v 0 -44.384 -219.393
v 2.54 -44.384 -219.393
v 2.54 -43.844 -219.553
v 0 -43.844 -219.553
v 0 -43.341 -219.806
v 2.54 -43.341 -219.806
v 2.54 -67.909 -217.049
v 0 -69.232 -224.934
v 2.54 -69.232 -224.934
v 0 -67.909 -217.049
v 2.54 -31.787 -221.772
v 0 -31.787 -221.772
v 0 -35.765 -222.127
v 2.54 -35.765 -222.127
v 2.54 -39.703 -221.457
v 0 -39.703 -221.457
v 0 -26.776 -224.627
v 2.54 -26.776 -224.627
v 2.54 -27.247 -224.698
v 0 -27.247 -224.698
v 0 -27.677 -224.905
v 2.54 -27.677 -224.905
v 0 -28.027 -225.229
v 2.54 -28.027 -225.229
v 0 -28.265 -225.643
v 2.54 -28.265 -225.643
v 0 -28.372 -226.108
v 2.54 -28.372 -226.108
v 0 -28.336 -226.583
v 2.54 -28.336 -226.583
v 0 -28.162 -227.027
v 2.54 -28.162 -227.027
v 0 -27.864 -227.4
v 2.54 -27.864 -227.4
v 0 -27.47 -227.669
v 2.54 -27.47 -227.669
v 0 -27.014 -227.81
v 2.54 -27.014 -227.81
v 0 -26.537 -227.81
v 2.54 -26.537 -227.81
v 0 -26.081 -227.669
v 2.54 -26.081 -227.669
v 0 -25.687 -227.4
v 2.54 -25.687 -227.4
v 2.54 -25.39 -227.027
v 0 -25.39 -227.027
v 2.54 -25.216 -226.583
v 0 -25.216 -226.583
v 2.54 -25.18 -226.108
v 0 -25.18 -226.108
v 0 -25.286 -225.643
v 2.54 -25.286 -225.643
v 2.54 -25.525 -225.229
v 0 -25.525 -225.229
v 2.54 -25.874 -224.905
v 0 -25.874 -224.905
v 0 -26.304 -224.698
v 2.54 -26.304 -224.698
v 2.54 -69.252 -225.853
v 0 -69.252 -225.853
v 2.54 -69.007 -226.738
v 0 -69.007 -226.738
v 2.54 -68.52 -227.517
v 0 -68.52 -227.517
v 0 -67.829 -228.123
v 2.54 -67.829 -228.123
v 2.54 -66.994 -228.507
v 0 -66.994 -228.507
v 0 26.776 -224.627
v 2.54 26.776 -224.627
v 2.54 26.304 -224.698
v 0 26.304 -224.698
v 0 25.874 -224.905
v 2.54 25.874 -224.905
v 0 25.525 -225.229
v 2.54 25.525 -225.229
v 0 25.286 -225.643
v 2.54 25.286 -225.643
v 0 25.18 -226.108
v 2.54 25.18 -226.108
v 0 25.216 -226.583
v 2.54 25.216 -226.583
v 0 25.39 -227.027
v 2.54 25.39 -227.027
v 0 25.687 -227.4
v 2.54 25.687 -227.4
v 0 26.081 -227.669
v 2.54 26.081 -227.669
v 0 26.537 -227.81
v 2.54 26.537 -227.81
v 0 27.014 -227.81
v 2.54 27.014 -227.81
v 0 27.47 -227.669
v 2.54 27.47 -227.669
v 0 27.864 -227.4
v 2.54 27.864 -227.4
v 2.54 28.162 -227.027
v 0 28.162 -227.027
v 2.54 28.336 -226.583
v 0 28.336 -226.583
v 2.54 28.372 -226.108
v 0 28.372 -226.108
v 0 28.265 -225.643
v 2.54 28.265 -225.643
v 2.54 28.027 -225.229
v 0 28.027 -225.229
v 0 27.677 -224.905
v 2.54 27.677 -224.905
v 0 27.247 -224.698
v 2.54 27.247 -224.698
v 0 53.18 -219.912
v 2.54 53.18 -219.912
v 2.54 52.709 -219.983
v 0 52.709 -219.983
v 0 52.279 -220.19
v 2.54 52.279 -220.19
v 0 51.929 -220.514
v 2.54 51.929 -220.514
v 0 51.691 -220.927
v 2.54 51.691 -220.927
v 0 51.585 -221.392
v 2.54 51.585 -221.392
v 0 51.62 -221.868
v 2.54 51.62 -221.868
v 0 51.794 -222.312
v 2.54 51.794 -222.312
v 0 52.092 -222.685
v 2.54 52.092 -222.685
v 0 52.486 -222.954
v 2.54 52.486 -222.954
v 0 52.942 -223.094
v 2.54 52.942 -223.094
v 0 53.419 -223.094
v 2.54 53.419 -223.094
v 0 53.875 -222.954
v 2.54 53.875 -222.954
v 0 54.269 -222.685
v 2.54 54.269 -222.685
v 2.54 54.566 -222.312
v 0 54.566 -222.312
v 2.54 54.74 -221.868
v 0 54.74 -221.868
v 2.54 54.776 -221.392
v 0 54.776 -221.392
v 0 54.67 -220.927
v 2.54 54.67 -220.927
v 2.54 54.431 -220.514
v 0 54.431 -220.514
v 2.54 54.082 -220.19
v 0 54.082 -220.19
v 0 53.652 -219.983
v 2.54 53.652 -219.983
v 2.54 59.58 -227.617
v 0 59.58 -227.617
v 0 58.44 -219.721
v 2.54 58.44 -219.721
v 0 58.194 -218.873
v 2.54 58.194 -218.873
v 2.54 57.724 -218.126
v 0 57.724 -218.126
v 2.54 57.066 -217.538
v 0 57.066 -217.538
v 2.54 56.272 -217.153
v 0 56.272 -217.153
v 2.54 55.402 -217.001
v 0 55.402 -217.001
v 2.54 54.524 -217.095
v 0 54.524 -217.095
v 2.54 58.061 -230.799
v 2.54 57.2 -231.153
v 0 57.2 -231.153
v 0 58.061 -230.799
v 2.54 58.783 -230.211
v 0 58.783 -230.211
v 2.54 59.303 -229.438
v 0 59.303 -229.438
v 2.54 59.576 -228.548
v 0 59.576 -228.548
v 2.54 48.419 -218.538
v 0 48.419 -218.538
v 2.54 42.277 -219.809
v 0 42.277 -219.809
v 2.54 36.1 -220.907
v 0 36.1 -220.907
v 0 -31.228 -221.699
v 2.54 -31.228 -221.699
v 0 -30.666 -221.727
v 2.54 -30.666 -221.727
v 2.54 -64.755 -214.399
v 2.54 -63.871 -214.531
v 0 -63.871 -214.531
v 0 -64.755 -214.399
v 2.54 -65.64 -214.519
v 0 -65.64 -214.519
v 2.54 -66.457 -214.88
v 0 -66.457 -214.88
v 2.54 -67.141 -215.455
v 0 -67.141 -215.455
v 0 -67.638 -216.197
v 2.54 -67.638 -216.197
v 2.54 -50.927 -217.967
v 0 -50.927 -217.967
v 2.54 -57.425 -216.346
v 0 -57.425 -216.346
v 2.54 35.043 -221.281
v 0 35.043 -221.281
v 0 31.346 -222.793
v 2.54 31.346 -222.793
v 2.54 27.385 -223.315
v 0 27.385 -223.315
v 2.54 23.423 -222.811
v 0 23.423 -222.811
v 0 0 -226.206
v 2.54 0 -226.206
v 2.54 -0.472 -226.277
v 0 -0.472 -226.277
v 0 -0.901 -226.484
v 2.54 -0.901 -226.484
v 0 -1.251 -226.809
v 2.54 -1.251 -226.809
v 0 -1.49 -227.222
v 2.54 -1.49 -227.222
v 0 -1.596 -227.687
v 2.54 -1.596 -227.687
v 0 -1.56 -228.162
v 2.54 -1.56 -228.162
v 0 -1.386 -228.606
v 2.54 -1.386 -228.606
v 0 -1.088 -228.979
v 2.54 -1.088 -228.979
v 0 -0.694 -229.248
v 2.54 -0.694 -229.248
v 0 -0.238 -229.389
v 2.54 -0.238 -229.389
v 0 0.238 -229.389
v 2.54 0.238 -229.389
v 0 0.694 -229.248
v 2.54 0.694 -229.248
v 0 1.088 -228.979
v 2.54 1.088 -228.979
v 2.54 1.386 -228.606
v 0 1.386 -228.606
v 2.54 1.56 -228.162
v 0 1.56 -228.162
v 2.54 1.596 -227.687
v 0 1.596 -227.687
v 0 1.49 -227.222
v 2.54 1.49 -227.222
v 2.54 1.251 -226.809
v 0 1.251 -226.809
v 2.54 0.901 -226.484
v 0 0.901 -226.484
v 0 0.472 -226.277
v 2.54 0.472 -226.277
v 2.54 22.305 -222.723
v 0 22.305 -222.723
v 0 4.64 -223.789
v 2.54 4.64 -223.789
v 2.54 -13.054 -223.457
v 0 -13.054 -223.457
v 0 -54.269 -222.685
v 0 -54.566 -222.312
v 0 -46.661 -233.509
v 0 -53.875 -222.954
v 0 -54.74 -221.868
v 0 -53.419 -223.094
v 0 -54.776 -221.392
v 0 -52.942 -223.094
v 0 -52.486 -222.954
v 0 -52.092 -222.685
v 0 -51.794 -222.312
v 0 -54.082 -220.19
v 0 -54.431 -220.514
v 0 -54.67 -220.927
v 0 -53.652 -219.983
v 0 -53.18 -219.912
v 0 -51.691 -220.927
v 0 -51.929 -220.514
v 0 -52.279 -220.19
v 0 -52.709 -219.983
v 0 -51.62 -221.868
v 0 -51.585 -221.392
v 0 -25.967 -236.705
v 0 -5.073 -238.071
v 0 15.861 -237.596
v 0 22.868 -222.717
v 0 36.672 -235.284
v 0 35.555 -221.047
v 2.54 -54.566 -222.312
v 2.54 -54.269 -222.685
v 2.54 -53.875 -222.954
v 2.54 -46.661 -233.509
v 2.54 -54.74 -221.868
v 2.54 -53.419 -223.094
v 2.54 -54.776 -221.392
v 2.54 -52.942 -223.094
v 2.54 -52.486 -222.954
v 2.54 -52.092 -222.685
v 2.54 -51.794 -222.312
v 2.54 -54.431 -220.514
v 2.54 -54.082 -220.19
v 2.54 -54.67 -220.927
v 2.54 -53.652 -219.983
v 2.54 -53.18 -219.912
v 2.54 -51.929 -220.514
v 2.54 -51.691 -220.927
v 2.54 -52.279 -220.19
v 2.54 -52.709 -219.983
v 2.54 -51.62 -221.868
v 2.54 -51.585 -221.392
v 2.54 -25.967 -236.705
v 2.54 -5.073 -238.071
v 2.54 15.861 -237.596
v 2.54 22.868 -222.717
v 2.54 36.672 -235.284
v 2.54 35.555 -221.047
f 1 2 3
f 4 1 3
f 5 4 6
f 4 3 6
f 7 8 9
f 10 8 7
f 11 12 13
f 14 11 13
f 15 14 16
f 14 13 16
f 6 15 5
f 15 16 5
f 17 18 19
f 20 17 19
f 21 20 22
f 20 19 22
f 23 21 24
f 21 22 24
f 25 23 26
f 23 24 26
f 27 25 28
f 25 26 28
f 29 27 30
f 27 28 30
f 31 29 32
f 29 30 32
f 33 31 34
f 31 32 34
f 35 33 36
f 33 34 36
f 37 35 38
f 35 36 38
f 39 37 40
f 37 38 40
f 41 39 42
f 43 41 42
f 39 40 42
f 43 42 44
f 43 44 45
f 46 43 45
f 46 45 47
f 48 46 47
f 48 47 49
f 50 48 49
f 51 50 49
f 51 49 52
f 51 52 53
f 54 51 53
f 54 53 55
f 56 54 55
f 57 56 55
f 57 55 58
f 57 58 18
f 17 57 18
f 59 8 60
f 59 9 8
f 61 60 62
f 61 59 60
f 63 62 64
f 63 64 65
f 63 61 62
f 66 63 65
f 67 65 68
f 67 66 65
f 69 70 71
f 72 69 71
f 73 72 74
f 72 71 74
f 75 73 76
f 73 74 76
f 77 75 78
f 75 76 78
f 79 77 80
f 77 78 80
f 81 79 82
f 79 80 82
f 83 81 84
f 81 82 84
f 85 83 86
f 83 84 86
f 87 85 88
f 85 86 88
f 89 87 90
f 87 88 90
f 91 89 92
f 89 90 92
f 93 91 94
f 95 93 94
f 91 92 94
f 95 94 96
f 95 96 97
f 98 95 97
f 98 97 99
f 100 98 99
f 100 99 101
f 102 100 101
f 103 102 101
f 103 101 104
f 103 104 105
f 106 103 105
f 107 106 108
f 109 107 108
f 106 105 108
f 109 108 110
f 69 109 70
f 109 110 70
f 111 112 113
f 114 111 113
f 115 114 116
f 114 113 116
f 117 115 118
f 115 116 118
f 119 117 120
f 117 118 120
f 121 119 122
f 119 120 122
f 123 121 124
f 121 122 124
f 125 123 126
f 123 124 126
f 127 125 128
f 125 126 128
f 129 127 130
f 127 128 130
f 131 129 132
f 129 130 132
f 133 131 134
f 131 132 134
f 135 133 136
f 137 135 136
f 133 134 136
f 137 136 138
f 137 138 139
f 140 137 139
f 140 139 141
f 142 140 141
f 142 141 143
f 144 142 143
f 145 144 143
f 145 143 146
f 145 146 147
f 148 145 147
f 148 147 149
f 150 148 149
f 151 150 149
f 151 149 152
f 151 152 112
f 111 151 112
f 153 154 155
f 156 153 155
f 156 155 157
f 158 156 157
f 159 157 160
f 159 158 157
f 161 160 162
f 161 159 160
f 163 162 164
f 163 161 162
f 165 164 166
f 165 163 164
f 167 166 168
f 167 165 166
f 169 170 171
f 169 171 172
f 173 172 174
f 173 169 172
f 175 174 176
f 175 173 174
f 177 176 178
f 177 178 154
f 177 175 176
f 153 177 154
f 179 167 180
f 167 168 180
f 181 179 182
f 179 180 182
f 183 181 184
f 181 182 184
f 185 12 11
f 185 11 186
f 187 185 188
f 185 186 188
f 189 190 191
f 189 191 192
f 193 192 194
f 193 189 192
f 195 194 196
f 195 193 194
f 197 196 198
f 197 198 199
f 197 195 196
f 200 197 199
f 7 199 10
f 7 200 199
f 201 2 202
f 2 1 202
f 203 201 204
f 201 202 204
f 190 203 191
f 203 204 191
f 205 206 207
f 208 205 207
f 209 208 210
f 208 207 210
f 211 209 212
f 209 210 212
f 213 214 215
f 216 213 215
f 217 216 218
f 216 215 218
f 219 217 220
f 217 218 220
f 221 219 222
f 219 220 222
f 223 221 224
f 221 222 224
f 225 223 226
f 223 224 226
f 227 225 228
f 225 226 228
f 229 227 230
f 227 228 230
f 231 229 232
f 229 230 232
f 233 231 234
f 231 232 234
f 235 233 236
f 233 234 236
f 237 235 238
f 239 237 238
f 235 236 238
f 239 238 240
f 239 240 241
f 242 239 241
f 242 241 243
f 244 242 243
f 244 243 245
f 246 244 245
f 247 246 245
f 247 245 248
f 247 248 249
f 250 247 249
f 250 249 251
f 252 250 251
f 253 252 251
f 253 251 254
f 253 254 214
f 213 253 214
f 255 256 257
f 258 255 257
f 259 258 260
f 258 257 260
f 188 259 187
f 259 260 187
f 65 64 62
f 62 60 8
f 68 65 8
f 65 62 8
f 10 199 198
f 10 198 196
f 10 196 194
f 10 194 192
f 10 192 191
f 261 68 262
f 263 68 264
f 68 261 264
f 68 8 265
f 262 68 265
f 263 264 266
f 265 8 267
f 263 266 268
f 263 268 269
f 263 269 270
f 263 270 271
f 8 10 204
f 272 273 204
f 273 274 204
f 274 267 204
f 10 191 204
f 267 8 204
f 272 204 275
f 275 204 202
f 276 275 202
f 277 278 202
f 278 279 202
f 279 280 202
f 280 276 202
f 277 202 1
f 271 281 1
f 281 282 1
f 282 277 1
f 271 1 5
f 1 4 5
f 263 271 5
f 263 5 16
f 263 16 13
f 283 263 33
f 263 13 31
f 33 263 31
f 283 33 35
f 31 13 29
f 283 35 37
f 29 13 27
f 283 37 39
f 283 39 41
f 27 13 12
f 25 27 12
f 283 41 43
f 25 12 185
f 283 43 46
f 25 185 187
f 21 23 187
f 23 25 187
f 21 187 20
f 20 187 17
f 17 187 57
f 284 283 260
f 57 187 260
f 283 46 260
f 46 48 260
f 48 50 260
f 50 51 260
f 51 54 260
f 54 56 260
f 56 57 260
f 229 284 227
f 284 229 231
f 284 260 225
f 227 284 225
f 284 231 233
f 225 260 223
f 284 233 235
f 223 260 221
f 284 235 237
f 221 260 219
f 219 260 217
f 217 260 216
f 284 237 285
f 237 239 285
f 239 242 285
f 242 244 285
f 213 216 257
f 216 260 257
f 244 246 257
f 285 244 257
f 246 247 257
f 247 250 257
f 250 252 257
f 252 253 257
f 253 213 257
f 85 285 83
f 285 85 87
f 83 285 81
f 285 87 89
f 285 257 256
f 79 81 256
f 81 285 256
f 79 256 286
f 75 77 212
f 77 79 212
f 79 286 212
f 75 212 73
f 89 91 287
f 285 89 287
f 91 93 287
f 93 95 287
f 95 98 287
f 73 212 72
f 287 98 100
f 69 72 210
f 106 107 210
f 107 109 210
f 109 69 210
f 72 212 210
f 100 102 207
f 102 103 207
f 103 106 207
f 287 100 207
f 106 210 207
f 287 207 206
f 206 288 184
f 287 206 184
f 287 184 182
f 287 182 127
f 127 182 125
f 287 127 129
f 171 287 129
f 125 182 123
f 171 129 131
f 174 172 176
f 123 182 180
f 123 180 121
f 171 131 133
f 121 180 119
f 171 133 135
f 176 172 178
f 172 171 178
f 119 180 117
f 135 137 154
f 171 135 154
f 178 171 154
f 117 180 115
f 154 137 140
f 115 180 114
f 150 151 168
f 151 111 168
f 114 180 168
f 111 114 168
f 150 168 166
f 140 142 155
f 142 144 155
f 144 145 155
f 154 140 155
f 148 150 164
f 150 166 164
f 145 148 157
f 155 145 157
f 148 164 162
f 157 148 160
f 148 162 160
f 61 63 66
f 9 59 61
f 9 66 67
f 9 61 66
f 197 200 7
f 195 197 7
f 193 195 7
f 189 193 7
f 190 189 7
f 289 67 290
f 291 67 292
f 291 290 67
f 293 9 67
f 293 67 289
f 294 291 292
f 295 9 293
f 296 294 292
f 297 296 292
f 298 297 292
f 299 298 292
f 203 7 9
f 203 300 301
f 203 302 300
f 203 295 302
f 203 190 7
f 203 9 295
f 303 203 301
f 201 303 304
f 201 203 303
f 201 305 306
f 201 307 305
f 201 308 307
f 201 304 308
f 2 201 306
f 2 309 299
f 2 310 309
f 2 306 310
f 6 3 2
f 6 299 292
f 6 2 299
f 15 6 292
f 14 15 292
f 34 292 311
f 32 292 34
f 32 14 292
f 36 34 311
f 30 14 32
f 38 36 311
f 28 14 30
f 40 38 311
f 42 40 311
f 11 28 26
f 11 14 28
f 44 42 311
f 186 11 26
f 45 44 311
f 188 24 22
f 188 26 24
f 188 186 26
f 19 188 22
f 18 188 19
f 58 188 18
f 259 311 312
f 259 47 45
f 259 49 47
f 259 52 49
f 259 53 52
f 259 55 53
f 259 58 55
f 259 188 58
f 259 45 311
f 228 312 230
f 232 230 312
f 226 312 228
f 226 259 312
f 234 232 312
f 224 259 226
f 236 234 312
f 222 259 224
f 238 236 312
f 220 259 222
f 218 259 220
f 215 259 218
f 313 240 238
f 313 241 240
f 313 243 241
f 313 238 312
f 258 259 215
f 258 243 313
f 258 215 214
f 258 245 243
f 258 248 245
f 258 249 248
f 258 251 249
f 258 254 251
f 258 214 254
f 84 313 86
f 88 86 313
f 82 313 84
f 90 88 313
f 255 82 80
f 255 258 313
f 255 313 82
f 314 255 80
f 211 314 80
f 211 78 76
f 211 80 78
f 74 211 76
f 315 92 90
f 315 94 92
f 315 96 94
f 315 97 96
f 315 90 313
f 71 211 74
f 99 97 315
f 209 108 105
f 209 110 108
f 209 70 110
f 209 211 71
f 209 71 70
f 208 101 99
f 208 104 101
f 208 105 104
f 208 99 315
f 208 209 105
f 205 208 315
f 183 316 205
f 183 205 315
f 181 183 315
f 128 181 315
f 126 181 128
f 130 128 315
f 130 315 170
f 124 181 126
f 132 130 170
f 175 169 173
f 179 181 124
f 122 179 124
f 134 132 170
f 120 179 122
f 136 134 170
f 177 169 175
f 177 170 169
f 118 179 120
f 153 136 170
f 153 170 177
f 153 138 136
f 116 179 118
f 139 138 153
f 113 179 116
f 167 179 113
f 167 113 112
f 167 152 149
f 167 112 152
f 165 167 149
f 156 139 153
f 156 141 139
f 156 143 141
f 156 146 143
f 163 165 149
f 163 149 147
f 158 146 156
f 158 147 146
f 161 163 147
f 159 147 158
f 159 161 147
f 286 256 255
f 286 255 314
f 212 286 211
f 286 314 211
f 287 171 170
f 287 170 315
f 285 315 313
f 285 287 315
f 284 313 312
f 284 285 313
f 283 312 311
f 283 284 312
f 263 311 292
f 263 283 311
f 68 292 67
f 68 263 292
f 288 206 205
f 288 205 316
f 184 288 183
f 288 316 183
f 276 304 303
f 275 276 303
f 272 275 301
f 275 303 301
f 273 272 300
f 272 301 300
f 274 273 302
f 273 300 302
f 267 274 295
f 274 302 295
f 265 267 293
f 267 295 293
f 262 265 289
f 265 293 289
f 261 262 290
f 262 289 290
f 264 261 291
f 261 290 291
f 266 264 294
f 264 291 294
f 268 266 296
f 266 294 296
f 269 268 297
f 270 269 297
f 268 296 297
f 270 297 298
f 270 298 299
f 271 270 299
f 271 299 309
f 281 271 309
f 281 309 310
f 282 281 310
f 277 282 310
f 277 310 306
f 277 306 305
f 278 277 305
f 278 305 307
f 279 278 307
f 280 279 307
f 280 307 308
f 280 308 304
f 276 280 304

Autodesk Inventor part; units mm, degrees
ref_plane "YZ Plane" through (0, 0, 0) normal (1, 0, 0) x (0, 1, 0)
ref_plane "XZ Plane" through (0, 0, 0) normal (0, 1, 0) x (-1, 0, 0)
ref_plane "XY Plane" through (0, 0, 0) normal (0, 0, 1) x (1, 0, 0)
sketch "Sketch1" plane through (0, 0, 0) normal (1, 0, 0) x (0, 1, 0)
  arc A0 (-67.3092, -213.4776) -> (57.9334, -216.2104) centre (0, 0) ccw
  arc A1 (-69.6961, -221.0477) -> (59.9878, -223.8775) centre (0, 0) ccw construction
  line L0 (0, 0) -> (-69.6961, -221.0477) construction
  line L1 (0, 0) -> (59.9878, -223.8775) construction
  line L2 (59.9878, -223.8775) -> (57.9334, -216.2104) construction
  line L3 (0, -287.3347) -> (0, 47.8891) construction
  arc A2 (-69.6961, -227.6971) -> (59.9878, -230.4452) centre (0, 0) ccw
  arc A3 (-68.5027, -217.2627) -> (58.9606, -220.0439) centre (0, 0) ccw construction
  arc A4 (-68.5027, -217.2627) -> (-53.1803, -221.5119) centre (0, 0) ccw
  line L4 (-53.1803, -221.5119) -> (0, 0) construction
  arc A5 (-35.1466, -206.5815) -> (27.3518, -207.7573) centre (0, 0) ccw construction
  line L5 (0, 0) -> (27.3518, -207.7573) construction
  line L6 (0, 0) -> (209.55, 0) construction
  circle A6 centre (27.3518, -207.7573) radius 15.5575
  circle A7 centre (-35.1466, -206.5815) radius 15.5575
  line L7 (59.9878, -230.4452) -> (57.9334, -216.2104)
  line L8 (-69.6961, -227.6971) -> (-67.3092, -213.4776)
  point P0 (-26.7758, -226.2272)
  point P1 (0, -227.8063)
  point P2 (26.7758, -226.2272)
  point P3 (53.1803, -221.5119)
  point P4 (35.5128, -221.0024)
  point P5 (22.8969, -222.6633)
  point P6 (-31.2556, -221.6446)
  point P7 (-43.8, -219.5103)
  dimension "d0" = 223.8375
  dimension "d1" = 231.775
  dimension "d2" = 32.5
  dimension "d3" = 15
  dimension "d4" = 238.125
  dimension "d5" = 4
  dimension "d8" = 27
  dimension "d19" = 209.55
  dimension "d20" = 82.5
  dimension "d21" = 62.5094
  dimension "d22" = 31.115
  dimension "d23" = 31.115
extrude "Extrusion1" add sketch "Sketch1" along normal blind 2.54 contours A0 A7 A6 L7 A2 L8
hole "Hole1" at (0, -53.1803, -221.5119) at (0, -26.7758, -226.2272) at (0, 0, -227.8063) at (0, 26.7758, -226.2272) at (0, 53.1803, -221.5119) direction (1, 0, 0) diameter 3.2004 end through all clearance for "Flat Head Machine Screw" size "M3" standard "Ansi Metric M Profile"
fillet "Fillet1" radius 3.175 8 edges at (1.27, 57.9334, -216.2104) (1.27, 59.9878, -230.4452) (1.27, 35.5128, -221.0024) (1.27, 22.8969, -222.6633) (1.27, -31.2556, -221.6446) (1.27, -43.8, -219.5103) (1.27, -67.3092, -213.4776) (1.27, -69.6961, -227.6971)
properties part number "3DPRINT,HOOD,ALIGNMENT,PLATES" material "Nylon 6/6"
